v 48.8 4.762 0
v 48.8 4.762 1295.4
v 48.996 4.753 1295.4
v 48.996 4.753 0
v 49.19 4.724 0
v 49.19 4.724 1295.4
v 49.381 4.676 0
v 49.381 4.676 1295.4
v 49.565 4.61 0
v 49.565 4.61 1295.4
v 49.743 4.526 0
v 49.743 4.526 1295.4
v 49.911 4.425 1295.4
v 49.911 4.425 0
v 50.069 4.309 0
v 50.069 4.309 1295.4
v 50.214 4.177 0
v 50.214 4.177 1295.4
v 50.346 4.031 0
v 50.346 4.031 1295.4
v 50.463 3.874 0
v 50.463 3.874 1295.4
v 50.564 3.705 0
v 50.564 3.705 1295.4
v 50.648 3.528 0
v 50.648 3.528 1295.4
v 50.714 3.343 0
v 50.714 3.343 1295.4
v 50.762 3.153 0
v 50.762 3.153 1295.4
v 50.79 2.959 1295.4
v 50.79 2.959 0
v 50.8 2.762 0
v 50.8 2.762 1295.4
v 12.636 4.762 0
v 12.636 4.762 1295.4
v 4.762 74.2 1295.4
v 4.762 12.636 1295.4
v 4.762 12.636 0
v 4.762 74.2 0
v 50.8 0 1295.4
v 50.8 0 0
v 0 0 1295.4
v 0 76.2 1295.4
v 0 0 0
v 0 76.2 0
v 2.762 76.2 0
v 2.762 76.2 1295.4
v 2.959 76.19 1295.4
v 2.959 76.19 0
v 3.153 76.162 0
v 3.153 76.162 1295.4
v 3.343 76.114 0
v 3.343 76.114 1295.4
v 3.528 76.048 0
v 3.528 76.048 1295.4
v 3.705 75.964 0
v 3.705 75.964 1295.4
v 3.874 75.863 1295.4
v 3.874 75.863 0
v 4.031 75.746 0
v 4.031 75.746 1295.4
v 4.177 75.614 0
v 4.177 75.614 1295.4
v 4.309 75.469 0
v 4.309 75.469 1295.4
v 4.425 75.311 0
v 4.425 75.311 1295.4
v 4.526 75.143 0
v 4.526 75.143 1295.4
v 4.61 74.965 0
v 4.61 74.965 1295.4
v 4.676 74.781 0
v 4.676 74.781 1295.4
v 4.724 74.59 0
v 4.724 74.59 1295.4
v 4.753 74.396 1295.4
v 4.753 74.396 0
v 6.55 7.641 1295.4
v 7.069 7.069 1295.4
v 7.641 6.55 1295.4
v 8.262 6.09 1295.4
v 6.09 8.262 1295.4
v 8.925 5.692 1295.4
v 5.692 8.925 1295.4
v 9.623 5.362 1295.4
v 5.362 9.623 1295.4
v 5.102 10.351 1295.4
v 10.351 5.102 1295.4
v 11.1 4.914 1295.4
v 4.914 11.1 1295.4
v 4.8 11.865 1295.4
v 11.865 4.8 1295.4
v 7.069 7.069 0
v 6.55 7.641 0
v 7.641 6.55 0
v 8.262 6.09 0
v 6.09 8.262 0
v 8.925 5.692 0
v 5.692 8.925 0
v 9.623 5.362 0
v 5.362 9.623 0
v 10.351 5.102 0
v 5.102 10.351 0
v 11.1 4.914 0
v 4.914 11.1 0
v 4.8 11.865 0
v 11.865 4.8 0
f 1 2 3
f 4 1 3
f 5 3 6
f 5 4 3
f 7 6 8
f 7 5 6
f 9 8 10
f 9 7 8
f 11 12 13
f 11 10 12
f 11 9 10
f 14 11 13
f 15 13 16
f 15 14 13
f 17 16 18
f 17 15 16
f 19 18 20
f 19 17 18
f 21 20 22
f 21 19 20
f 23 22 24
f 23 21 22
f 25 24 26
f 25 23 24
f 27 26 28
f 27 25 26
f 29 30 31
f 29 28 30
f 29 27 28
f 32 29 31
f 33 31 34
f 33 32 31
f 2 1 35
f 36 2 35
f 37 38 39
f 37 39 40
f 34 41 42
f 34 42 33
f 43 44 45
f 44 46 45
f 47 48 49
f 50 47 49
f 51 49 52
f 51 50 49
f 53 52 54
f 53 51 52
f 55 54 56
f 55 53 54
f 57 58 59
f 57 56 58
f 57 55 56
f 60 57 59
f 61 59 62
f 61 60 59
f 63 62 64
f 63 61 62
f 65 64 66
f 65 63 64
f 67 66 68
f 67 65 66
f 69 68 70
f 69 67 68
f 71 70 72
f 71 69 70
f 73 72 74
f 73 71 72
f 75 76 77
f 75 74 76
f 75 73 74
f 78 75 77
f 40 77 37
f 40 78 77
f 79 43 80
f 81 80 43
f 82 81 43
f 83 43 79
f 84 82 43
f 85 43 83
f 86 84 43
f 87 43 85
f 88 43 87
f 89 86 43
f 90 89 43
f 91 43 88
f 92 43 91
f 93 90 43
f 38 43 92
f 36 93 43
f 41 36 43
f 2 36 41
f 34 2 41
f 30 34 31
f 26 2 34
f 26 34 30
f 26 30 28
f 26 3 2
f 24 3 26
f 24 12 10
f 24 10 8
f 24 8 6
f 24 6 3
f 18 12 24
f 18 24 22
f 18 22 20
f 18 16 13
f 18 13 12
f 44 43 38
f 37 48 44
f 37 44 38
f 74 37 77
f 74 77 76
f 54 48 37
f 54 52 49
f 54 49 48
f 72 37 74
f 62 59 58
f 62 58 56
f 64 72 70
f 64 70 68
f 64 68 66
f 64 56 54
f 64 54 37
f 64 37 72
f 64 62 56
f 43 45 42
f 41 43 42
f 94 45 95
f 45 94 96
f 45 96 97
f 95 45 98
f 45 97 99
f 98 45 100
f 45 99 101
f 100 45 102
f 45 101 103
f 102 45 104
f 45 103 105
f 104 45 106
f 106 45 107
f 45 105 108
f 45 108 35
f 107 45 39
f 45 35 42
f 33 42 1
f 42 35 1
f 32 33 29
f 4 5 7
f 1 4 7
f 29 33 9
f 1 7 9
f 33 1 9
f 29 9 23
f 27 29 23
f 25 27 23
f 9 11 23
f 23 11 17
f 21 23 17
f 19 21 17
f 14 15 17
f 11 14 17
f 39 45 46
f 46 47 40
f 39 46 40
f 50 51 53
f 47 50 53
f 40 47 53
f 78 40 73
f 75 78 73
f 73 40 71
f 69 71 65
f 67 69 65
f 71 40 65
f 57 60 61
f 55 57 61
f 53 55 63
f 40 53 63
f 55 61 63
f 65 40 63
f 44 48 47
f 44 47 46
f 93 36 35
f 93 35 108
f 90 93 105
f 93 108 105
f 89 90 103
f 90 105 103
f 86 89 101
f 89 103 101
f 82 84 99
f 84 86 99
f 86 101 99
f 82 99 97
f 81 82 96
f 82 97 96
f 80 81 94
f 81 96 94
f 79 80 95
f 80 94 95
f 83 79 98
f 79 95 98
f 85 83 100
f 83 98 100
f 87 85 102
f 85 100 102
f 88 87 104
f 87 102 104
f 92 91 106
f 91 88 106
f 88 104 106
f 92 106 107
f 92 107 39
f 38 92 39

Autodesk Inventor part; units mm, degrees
ref_plane "YZ Plane" through (0, 0, 0) normal (1, 0, 0) x (0, 1, 0)
ref_plane "Start plane" through (0, 0, 0) normal (0, 0, 1) x (1, 0, 0)
ref_plane "End plane" through (0, 0, 1295.4) normal (0, 0, 1) x (1, 0, 0)
sketch "Sketch" plane through (0, 0, 0) normal (0, 0, 1) x (1, 0, 0)
  line L0 (0, 76.2) -> (0, 0)
  line L1 (0, 0) -> (50.8, 0)
  line L2 (50.8, 0) -> (50.8, 2.7625)
  line L3 (48.8, 4.7625) -> (12.6365, 4.7625)
  line L4 (4.7625, 12.6365) -> (4.7625, 74.2)
  line L5 (2.7625, 76.2) -> (0, 76.2)
  line L6 (-7.0414, 0) -> (21.5385, 0) construction
  line L7 (0, -8.0414) -> (0, 34.5385) construction
  arc A0 (4.7625, 12.6365) -> (12.6365, 4.7625) centre (12.6365, 12.6365) ccw
  arc A1 (50.8, 2.7625) -> (48.8, 4.7625) centre (48.8, 2.7625) ccw
  arc A2 (4.7625, 74.2) -> (2.7625, 76.2) centre (2.7625, 74.2) ccw
  line L8 (0, 93.5453) -> (0, -24.9725) construction
  line L9 (-18.6925, 0) -> (62.8653, 0) construction
  point P0 (50.8, 4.7625)
  point P1 (4.7625, 4.7625)
  point P2 (4.7625, 76.2)
  dimension "d12" = 4.7625
  dimension "d13" = 76.2
  dimension "d14" = 50.8
  dimension "d15" = 0
  dimension "d16" = 4.7625
  dimension "d17" = 0
  dimension "d18" = 7.874
  dimension "d19" = 2
extrude "Body" add sketch "Sketch" along normal up to surface (1295.4 mm away) from surface at 0
sketch "Sketch3" plane through (0, 0, 0) normal (0, 0, 1) x (1, 0, 0)
  line L0 (0, 0) -> (10, 0)
ref_plane "Work Plane3" through (0, 0, 0) normal (0, -1, 0) x (1, 0, 0)
sketch "Sketch4" plane through (0, 0, 0) normal (0, -1, 0) x (1, 0, 0)
  line L0 (-2, 0) -> (12, 0)
  line L1 (-2, 1295.4) -> (12, 1295.4)
  dimension "d23" = 1295.4
equation "\"d12\" = G_T"
equation "\"d13\" = G_H"
equation "\"d14\" = G_W"
equation "\"d16\" = G_T"
equation "\"d18\" = G_IR"
equation "\"d4\" = G_L"
equation "\"G_W\" = 50.8"
equation "\"G_H\" = 76.2"
equation "\"G_T\" = 4.7625"
equation "\"G_ER\" = 4.064"
equation "\"G_IR\" = 7.874"
equation "\"G_L\" = d23"
equation "\"ex\" = 0"
equation "\"ey\" = 0"
equation "\"G_OFFSET_START\" = 0"
equation "\"G_OFFSET_END\" = 0"
equation "\"d21\" = G_OFFSET_END + B_L"
equation "\"B_L\" = 1295.4"
properties part number "ANSI L 3 x 2 x 3_16 00000003"
